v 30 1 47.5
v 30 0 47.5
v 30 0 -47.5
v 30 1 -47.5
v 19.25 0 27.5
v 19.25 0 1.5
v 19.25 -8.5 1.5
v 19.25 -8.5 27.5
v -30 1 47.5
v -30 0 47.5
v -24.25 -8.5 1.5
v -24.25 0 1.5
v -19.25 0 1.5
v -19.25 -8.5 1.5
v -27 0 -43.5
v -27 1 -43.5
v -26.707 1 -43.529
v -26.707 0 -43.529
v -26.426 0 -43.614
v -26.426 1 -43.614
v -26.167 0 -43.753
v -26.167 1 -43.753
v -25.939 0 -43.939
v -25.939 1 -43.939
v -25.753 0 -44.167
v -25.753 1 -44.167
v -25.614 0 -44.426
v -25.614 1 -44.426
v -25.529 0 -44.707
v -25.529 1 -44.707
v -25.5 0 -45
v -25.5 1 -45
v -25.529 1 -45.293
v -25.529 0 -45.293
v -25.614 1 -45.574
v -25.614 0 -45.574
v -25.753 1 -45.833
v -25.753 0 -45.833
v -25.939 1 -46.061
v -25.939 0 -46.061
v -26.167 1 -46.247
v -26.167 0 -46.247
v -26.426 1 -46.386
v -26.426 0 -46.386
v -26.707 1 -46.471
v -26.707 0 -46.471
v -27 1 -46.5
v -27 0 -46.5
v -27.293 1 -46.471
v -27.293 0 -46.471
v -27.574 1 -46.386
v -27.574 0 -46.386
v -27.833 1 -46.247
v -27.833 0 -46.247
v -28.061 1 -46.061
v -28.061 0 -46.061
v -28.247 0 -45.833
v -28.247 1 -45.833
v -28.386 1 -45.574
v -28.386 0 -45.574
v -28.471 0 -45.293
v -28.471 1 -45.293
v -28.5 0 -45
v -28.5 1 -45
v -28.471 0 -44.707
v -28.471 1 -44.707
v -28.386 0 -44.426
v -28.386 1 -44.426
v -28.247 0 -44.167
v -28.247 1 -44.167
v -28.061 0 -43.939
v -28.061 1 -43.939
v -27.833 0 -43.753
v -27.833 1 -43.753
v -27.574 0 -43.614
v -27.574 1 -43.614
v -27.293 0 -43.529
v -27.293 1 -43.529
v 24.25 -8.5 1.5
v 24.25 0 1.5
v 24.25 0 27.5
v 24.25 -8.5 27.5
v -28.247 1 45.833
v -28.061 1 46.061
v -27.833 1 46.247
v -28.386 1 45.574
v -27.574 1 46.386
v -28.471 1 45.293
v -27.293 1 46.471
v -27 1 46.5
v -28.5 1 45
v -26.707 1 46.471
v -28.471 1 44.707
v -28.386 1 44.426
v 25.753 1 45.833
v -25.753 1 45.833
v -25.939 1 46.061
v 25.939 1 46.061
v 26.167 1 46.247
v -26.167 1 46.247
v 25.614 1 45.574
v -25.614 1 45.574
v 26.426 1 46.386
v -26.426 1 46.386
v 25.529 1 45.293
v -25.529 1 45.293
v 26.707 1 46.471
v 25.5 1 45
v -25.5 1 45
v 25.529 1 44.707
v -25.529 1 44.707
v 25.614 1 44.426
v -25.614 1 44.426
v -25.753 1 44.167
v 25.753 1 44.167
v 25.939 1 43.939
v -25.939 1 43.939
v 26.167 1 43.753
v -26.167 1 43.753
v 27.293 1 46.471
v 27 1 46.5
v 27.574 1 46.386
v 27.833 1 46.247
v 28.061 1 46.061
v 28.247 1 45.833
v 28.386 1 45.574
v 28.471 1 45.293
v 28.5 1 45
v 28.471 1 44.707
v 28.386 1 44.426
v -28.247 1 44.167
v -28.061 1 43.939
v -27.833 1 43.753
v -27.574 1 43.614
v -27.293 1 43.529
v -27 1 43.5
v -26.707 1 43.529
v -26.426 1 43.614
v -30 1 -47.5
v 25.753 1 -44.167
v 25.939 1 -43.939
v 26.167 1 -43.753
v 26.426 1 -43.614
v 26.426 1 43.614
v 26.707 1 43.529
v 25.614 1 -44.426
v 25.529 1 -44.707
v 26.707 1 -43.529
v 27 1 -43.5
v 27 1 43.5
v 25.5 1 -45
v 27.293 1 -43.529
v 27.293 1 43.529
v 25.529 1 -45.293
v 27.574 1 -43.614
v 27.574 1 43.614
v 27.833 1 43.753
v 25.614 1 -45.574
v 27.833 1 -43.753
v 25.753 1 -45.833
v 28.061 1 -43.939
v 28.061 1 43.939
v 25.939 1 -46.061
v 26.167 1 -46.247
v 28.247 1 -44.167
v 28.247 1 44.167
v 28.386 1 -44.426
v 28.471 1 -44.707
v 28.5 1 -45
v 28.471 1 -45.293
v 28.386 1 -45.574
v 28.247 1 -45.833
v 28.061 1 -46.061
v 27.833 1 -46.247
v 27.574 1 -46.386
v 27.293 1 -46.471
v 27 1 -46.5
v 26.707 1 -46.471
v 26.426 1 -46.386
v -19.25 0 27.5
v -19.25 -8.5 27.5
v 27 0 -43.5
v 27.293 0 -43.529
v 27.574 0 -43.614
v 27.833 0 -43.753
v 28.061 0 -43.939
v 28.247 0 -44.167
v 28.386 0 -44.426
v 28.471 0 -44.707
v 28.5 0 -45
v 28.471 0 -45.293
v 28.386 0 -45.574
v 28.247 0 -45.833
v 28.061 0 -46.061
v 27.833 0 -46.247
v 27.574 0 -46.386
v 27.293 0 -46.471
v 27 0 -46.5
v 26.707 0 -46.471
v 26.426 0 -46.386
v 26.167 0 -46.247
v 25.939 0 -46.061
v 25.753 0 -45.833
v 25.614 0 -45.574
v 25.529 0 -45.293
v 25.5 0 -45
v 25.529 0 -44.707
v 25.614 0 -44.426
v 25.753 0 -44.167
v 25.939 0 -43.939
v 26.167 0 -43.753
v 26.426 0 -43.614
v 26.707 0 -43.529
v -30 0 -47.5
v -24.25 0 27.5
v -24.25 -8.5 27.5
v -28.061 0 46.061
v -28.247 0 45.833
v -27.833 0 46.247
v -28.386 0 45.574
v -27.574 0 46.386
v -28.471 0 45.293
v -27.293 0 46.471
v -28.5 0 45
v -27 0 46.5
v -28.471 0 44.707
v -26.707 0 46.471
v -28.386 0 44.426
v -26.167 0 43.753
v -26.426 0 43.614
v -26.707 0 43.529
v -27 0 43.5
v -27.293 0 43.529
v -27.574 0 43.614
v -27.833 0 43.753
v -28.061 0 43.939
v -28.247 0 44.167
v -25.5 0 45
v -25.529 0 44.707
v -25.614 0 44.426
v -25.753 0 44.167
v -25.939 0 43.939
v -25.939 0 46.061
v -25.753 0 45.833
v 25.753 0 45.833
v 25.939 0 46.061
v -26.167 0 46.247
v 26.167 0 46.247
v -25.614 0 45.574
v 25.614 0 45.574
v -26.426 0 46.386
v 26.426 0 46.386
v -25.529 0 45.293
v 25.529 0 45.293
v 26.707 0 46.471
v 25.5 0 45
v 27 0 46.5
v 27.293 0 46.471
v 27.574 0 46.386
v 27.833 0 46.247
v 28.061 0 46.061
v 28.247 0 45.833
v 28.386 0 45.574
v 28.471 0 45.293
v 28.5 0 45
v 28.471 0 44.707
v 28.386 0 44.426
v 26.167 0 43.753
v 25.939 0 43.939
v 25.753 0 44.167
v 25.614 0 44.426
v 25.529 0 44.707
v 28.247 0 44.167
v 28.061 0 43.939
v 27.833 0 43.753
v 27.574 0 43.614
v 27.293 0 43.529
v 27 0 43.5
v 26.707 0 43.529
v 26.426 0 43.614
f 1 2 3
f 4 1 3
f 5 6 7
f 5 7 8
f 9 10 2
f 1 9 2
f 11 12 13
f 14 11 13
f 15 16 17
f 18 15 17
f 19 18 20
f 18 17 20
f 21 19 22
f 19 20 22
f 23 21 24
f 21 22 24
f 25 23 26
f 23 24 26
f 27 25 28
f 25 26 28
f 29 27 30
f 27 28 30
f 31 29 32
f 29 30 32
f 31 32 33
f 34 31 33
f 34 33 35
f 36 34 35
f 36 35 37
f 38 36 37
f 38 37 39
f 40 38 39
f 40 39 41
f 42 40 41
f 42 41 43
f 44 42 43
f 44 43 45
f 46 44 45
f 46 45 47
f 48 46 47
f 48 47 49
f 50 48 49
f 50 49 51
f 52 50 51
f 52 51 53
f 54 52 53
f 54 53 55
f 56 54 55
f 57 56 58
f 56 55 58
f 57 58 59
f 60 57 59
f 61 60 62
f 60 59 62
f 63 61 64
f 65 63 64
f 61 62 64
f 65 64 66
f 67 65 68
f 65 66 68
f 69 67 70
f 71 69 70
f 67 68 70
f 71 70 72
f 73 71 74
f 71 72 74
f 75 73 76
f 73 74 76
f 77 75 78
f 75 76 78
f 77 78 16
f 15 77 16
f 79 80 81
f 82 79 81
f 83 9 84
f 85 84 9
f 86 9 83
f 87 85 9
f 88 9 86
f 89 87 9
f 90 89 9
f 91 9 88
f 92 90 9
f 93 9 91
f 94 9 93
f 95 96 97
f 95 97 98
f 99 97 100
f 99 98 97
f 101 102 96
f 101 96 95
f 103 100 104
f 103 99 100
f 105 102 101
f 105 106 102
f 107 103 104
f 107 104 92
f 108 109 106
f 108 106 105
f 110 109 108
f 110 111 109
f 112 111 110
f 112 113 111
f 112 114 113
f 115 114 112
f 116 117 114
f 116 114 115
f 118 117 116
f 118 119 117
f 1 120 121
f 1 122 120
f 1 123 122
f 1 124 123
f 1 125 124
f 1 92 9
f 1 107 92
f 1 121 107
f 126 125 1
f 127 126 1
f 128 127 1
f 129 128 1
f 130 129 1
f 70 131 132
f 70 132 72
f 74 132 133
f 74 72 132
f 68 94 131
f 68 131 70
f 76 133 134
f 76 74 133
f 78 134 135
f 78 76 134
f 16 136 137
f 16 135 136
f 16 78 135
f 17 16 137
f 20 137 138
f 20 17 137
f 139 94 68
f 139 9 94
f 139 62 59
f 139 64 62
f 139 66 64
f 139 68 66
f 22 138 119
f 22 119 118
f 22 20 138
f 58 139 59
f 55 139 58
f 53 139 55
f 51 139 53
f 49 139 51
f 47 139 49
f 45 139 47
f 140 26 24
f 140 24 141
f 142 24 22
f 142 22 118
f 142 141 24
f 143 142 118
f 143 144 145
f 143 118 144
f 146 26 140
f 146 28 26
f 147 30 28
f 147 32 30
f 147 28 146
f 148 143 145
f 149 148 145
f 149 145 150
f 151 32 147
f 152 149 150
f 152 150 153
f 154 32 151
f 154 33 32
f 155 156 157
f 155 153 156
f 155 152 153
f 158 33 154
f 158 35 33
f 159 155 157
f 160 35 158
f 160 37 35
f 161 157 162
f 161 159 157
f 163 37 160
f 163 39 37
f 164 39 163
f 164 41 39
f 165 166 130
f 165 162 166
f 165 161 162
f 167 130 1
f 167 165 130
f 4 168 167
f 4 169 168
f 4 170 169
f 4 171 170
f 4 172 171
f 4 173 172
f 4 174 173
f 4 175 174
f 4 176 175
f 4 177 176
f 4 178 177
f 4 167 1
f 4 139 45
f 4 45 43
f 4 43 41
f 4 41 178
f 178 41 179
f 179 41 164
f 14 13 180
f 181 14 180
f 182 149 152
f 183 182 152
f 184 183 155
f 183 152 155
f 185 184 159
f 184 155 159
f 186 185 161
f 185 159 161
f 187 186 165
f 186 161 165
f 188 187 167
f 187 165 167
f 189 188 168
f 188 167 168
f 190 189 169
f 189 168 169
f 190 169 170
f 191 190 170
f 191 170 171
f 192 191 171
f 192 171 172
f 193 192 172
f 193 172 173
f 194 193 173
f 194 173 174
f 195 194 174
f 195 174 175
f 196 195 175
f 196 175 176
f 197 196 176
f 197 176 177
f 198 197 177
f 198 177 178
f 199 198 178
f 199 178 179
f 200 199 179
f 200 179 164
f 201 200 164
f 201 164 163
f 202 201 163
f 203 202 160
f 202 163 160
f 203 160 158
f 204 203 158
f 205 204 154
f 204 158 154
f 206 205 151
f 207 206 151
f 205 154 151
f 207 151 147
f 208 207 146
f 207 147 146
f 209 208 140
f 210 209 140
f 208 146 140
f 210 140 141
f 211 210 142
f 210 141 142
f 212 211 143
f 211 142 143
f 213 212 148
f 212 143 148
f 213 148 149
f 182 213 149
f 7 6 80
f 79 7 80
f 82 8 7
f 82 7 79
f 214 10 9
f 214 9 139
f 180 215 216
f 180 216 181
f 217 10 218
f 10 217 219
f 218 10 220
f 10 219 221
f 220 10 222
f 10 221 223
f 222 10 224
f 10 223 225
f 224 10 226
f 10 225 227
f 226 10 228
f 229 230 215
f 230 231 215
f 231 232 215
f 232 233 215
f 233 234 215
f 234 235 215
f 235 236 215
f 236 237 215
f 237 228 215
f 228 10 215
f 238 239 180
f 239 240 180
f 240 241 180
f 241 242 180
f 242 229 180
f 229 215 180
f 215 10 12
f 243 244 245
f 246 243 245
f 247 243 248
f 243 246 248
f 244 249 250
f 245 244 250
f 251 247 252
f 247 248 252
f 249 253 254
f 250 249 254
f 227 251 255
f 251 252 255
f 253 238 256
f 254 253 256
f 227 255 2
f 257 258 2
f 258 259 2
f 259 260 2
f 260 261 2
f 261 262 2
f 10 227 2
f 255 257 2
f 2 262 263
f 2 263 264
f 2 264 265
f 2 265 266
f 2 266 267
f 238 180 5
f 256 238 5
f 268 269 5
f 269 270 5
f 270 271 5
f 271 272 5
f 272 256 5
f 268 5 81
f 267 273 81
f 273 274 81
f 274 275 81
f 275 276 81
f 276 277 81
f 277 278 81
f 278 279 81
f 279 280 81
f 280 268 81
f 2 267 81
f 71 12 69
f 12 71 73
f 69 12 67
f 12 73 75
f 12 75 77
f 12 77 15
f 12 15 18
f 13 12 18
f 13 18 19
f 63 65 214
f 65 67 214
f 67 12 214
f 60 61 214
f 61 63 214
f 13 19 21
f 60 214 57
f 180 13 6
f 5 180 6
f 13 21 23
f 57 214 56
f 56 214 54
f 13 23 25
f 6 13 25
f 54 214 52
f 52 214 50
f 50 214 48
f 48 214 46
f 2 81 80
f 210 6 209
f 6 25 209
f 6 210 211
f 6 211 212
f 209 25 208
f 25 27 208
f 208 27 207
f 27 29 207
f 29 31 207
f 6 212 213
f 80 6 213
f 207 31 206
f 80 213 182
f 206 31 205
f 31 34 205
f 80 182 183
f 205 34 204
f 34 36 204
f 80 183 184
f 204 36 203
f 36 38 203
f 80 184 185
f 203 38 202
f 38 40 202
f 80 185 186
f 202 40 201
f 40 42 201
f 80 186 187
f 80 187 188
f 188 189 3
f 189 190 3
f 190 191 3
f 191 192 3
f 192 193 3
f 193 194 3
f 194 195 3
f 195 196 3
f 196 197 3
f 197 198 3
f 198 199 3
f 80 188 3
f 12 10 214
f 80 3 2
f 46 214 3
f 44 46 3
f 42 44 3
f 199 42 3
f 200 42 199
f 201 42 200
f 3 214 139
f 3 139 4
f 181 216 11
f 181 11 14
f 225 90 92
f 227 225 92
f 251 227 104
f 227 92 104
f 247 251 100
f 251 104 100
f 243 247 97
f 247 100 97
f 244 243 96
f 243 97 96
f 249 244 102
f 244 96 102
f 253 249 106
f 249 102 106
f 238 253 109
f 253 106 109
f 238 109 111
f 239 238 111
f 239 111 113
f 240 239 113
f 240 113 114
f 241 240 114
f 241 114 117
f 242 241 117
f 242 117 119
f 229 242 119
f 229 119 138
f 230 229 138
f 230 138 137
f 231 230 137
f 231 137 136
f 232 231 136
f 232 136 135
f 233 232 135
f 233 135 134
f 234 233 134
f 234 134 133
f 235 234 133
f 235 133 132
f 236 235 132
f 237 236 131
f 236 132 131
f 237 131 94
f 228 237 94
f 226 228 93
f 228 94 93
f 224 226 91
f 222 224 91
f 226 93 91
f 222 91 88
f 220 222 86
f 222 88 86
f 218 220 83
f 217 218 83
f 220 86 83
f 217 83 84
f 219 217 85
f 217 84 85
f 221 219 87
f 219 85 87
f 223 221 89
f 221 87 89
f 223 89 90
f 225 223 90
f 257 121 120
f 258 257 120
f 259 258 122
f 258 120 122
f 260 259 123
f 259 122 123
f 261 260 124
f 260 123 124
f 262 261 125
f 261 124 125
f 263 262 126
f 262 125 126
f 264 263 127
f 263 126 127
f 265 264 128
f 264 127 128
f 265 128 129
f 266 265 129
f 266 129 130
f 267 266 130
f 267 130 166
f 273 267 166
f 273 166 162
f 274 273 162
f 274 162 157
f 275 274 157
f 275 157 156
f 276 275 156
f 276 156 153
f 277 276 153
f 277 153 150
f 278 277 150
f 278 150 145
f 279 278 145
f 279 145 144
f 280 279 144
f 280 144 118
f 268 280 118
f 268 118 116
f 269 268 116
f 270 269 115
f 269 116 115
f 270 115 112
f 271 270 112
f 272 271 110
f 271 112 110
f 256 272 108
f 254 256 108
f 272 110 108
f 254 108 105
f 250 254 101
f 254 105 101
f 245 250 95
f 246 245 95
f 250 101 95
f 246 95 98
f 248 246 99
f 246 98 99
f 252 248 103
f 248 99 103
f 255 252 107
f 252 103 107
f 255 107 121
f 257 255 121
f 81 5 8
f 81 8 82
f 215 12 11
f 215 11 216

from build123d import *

# Parameters (mm, degrees)
SKETCH1_W           = 60
SKETCH1_H           = 95
BOSS_EXTRUDE1_DEPTH = 1
SKETCH2_W           = 5
SKETCH2_H           = 26
BOSS_EXTRUDE2_DEPTH = 8.5
CUT_EXTRUDE1_REACH  = 58.978
SKETCH3_R           = 1.5


with BuildPart() as part:
    # Sketch1 → Boss-Extrude1 (new body)
    with BuildSketch(Plane(origin=(0, 0, 0), x_dir=(1, 0, 0), z_dir=(0, 1, 0))):
        Rectangle(SKETCH1_W, SKETCH1_H)
    extrude(amount=BOSS_EXTRUDE1_DEPTH)

    # Sketch2 → Boss-Extrude2 (add)
    with BuildSketch(Plane.XZ):
        with Locations((21.75, 14.5)):
            Rectangle(SKETCH2_W, SKETCH2_H)
        with Locations((-21.75, 14.5)):
            Rectangle(SKETCH2_W, SKETCH2_H)
    extrude(amount=BOSS_EXTRUDE2_DEPTH)

    # Sketch3 → Cut-Extrude1 (cut, up to next)
    with BuildSketch(Plane(origin=(0, 1, 0), x_dir=(1, 0, 0), z_dir=(0, 1, 0)), mode=Mode.PRIVATE) as cut_extrude1_sk1:
        with Locations(Location((-27, -45, 0), (0, 0, 270))):
            Circle(SKETCH3_R)
    cut_extrude1_tool1 = extrude(cut_extrude1_sk1.sketch, amount=-CUT_EXTRUDE1_REACH, mode=Mode.PRIVATE) & part.part
    # Sketch3 → Cut-Extrude1 (cut, up to next)
    with BuildSketch(Plane(origin=(0, 1, 0), x_dir=(1, 0, 0), z_dir=(0, 1, 0)), mode=Mode.PRIVATE) as cut_extrude1_sk2:
        with Locations(Location((27, -45, 0), (0, 0, 270))):
            Circle(SKETCH3_R)
    cut_extrude1_tool2 = extrude(cut_extrude1_sk2.sketch, amount=-CUT_EXTRUDE1_REACH, mode=Mode.PRIVATE) & part.part
    # Sketch3 → Cut-Extrude1 (cut, up to next)
    with BuildSketch(Plane(origin=(0, 1, 0), x_dir=(1, 0, 0), z_dir=(0, 1, 0)), mode=Mode.PRIVATE) as cut_extrude1_sk3:
        with Locations(Location((27, 45, 0), (0, 0, 270))):
            Circle(SKETCH3_R)
    cut_extrude1_tool3 = extrude(cut_extrude1_sk3.sketch, amount=-CUT_EXTRUDE1_REACH, mode=Mode.PRIVATE) & part.part
    # Sketch3 → Cut-Extrude1 (cut, up to next)
    with BuildSketch(Plane(origin=(0, 1, 0), x_dir=(1, 0, 0), z_dir=(0, 1, 0)), mode=Mode.PRIVATE) as cut_extrude1_sk4:
        with Locations(Location((-27, 45, 0), (0, 0, 270))):
            Circle(SKETCH3_R)
    cut_extrude1_tool4 = extrude(cut_extrude1_sk4.sketch, amount=-CUT_EXTRUDE1_REACH, mode=Mode.PRIVATE) & part.part
    add(cut_extrude1_tool1.solids().sort_by_distance((-27, 1, 45))[0], mode=Mode.SUBTRACT)
    add(cut_extrude1_tool2.solids().sort_by_distance((27, 1, 45))[0], mode=Mode.SUBTRACT)
    add(cut_extrude1_tool3.solids().sort_by_distance((27, 1, -45))[0], mode=Mode.SUBTRACT)
    add(cut_extrude1_tool4.solids().sort_by_distance((-27, 1, -45))[0], mode=Mode.SUBTRACT)


solid = part.part
